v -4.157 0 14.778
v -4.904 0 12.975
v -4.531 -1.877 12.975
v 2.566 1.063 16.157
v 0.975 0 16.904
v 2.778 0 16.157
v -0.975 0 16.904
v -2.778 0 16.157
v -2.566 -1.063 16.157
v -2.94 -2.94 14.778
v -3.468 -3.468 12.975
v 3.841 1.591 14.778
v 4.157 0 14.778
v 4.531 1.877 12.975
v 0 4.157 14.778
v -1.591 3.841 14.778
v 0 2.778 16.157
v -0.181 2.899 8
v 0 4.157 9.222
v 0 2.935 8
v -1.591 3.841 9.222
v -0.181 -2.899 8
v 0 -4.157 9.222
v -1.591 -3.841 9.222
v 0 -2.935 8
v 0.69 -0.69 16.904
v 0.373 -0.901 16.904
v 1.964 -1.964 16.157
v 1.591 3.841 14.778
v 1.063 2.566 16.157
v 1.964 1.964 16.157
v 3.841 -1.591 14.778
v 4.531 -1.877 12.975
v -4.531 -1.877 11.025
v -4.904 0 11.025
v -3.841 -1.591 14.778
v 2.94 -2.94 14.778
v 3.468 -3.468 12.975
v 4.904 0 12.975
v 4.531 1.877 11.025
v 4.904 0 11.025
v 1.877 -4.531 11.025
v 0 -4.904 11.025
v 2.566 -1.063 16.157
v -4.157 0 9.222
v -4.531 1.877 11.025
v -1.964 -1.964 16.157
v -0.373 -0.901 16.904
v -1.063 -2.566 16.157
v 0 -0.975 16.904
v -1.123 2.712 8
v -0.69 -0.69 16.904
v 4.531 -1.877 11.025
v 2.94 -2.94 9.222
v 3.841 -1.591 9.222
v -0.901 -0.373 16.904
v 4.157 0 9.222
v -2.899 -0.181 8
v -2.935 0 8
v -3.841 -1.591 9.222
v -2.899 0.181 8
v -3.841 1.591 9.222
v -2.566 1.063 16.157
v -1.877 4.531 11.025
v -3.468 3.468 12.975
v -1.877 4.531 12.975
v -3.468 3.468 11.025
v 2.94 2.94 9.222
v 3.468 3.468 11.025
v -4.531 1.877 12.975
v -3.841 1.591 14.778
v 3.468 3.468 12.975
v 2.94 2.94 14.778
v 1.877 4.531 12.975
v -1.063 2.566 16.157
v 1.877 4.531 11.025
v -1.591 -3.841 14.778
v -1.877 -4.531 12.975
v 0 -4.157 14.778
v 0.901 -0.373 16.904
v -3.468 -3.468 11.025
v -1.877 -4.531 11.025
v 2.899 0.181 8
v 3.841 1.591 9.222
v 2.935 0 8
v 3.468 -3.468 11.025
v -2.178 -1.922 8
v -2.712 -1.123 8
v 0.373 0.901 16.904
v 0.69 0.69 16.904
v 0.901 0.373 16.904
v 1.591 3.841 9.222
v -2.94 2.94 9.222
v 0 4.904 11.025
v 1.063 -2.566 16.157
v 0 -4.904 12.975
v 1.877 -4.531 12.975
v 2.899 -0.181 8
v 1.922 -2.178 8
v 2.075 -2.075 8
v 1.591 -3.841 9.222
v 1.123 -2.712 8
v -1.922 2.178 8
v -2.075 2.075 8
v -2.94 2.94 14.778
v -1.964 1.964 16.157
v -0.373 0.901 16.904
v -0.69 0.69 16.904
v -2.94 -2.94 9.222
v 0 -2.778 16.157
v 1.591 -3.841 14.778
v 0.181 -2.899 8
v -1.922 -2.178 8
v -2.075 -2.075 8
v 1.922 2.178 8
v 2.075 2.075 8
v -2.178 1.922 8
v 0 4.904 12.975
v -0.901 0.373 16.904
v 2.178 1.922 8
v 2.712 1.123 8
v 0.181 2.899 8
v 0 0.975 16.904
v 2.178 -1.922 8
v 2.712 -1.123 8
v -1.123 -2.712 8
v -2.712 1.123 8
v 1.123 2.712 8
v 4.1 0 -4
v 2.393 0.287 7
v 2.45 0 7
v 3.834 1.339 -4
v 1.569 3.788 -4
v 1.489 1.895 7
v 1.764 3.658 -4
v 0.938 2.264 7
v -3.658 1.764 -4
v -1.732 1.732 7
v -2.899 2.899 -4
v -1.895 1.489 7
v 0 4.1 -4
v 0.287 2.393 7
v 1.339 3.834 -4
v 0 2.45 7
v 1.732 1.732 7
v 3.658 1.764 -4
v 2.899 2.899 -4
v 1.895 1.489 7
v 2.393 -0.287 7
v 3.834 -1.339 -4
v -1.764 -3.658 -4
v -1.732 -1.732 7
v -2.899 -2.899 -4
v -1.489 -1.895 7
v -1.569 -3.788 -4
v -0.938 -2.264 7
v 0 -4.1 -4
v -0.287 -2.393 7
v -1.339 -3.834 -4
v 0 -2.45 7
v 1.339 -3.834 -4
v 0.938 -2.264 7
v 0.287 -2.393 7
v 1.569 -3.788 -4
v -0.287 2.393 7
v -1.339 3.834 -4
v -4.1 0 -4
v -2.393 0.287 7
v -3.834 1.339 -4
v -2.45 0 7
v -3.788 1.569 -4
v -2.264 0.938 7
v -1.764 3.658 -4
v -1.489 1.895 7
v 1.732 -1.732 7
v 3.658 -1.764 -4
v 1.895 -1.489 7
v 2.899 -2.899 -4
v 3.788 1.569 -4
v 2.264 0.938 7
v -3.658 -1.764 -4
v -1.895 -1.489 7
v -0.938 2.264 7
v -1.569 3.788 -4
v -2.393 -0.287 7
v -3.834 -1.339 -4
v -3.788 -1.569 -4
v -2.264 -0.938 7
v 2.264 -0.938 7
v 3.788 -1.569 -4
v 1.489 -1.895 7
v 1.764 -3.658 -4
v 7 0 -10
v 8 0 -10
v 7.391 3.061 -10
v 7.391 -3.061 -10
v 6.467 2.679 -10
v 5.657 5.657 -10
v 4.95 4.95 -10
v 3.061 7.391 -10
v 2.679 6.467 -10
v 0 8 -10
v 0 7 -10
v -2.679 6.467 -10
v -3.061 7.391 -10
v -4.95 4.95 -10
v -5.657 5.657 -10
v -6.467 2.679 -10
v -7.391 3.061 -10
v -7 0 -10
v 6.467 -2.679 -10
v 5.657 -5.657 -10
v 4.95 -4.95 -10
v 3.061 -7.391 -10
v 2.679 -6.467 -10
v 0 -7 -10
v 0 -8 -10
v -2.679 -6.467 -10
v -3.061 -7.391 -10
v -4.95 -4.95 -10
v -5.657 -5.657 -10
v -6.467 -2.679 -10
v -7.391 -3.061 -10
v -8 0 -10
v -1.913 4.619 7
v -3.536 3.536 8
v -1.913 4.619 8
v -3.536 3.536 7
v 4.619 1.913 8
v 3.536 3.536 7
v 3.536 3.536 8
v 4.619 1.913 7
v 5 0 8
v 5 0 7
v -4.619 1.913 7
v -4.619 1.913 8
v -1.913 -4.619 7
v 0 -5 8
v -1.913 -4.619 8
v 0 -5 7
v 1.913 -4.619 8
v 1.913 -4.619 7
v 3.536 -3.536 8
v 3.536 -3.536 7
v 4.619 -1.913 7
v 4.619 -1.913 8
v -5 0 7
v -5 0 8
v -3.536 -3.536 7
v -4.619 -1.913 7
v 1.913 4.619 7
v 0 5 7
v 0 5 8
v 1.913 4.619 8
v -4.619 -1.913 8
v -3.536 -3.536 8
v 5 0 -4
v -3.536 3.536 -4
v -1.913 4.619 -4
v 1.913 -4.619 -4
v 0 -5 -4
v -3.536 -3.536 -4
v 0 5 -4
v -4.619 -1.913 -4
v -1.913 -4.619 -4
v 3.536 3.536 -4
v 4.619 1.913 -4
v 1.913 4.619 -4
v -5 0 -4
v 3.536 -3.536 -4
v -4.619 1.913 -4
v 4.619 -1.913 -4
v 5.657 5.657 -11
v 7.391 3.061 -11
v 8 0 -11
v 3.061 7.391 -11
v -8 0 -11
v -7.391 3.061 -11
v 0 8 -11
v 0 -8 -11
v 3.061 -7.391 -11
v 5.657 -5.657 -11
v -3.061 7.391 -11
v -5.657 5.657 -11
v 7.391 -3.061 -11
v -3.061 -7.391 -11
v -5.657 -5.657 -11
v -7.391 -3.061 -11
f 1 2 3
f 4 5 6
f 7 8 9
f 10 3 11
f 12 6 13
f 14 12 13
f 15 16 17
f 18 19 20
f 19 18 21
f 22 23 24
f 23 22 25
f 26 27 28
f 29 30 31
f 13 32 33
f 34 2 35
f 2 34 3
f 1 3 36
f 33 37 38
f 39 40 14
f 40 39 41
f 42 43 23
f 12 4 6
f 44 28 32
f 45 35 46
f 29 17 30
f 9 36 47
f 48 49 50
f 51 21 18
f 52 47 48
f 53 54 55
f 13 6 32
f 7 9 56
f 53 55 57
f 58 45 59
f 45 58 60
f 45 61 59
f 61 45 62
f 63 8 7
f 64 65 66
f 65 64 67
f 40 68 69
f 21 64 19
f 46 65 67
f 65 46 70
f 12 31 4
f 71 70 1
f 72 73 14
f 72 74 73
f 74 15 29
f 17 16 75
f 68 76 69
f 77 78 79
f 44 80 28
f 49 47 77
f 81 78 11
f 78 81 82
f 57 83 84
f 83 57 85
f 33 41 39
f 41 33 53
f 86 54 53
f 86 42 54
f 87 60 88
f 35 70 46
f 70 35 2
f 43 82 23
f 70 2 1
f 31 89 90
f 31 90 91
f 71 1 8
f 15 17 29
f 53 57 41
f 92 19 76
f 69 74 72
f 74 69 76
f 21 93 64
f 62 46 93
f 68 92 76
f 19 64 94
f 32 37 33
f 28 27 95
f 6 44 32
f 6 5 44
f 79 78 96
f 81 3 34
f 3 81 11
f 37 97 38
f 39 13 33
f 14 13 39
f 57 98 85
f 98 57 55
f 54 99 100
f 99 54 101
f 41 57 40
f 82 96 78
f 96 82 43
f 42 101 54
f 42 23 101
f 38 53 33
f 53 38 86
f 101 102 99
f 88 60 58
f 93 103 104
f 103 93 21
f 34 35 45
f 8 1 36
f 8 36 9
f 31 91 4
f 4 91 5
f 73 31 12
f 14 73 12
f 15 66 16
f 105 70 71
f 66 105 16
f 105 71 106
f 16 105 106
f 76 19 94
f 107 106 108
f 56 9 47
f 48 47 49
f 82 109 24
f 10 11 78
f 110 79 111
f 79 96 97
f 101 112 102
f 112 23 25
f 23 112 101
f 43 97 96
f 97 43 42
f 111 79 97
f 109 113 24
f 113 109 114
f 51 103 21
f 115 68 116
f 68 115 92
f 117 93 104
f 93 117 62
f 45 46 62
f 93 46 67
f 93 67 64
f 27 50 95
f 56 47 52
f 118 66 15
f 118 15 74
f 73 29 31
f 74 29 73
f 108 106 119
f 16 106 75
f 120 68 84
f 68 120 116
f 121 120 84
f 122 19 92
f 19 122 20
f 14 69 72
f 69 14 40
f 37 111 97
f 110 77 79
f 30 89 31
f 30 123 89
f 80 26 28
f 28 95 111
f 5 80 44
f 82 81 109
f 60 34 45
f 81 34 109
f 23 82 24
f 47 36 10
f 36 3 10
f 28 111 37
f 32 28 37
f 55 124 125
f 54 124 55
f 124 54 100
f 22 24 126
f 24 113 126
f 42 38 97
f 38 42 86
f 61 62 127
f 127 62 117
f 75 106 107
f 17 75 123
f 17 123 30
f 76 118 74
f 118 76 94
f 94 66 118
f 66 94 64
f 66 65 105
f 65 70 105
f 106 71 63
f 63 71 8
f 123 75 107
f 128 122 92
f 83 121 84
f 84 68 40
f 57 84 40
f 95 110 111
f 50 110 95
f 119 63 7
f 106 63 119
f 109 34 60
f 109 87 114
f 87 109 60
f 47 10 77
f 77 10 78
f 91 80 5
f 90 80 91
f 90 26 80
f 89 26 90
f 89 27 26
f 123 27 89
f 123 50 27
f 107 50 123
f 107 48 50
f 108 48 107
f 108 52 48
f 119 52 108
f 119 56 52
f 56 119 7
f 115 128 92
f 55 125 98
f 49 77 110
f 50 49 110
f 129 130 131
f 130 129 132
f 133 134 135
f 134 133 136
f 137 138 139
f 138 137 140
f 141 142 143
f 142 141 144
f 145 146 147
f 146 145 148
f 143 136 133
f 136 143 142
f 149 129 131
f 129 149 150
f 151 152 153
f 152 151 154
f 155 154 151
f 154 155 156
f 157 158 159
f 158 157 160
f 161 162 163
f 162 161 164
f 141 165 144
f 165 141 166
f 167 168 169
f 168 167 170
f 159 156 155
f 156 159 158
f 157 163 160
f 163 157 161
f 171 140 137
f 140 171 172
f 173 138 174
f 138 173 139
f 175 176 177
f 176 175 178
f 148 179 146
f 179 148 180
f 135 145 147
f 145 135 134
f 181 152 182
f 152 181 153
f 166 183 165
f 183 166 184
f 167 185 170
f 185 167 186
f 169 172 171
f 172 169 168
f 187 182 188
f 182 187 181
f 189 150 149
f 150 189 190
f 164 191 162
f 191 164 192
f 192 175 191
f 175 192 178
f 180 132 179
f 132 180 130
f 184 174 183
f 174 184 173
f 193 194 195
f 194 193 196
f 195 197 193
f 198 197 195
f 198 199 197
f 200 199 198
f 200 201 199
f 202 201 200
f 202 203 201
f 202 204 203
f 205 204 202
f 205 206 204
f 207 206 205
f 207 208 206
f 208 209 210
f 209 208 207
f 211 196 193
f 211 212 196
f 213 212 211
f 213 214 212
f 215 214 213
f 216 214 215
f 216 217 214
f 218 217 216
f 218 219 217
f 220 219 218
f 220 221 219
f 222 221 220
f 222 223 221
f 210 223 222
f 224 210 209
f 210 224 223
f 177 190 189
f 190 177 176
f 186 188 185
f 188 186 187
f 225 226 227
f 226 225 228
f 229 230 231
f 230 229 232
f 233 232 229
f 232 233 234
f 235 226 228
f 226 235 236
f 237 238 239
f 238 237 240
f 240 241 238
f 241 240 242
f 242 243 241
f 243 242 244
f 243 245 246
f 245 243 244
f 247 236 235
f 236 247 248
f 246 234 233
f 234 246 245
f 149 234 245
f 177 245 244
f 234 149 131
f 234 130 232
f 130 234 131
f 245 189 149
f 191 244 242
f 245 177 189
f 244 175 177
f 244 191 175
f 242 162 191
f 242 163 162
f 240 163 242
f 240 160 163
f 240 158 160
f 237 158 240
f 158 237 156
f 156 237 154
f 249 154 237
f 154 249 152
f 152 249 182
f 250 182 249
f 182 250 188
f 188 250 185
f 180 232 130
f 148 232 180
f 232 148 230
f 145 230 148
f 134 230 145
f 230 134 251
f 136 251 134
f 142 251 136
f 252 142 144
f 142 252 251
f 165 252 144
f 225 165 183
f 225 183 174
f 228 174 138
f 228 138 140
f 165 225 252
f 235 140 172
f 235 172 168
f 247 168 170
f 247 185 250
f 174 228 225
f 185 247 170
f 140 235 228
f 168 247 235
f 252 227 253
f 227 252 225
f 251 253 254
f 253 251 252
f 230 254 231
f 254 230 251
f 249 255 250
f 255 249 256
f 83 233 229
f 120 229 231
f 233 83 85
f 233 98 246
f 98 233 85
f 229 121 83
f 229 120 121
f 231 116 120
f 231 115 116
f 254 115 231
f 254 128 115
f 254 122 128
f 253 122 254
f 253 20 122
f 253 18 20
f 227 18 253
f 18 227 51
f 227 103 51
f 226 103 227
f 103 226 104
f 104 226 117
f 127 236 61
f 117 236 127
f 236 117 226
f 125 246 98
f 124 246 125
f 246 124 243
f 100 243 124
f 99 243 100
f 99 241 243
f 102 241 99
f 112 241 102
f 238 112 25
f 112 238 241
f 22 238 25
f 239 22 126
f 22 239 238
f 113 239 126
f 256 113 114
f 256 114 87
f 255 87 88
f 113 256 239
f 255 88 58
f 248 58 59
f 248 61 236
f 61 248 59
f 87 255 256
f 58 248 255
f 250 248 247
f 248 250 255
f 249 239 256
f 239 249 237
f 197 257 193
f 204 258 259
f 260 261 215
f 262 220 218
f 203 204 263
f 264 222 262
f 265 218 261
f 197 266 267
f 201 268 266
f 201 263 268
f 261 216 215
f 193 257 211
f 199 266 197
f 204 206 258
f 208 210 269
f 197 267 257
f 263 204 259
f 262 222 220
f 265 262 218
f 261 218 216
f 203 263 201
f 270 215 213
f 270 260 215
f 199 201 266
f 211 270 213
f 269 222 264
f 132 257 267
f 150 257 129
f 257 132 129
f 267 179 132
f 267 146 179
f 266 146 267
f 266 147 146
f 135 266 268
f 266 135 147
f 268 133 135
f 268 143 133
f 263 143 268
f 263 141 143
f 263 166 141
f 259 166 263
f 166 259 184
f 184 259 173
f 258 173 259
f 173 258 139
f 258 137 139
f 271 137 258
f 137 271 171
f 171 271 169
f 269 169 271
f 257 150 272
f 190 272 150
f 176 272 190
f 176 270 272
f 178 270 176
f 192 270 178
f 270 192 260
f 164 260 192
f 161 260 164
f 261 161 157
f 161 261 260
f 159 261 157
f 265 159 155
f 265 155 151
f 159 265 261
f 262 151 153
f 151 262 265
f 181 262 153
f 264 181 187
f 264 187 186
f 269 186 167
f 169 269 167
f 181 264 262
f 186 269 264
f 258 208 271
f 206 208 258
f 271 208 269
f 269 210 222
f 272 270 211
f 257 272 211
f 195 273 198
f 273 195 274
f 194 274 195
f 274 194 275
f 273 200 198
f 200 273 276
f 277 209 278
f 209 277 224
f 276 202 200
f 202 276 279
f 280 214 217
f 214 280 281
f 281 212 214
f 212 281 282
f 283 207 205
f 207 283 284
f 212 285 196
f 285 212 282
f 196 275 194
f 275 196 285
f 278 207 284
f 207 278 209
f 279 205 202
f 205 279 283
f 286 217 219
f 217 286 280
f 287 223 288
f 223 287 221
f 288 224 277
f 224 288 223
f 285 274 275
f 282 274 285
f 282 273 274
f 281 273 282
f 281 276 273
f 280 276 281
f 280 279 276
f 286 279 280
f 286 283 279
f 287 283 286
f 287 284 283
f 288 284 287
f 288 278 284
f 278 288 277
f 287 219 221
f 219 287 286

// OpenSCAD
resolution=16;//[2:128]
size=5;//[2:100]
pawn(size, resolution);
module pawn(s, res){
$fn=res;
translate([0, 0, 12/5*s])
sphere(r=s);
cylinder(h = s*4, r1 = s, r2 = 2/5*s, center = true);
translate([0, 0, 7/5*s])
cylinder(h = 1/5*s, r=s);
translate([0, 0, -2*s])
cylinder(h = 6/5*s, r1 = 7/5*s, r2 = s);
translate([0, 0, -11/5*s])
cylinder(h = 1/5*s, r= 8/5*s);
}
